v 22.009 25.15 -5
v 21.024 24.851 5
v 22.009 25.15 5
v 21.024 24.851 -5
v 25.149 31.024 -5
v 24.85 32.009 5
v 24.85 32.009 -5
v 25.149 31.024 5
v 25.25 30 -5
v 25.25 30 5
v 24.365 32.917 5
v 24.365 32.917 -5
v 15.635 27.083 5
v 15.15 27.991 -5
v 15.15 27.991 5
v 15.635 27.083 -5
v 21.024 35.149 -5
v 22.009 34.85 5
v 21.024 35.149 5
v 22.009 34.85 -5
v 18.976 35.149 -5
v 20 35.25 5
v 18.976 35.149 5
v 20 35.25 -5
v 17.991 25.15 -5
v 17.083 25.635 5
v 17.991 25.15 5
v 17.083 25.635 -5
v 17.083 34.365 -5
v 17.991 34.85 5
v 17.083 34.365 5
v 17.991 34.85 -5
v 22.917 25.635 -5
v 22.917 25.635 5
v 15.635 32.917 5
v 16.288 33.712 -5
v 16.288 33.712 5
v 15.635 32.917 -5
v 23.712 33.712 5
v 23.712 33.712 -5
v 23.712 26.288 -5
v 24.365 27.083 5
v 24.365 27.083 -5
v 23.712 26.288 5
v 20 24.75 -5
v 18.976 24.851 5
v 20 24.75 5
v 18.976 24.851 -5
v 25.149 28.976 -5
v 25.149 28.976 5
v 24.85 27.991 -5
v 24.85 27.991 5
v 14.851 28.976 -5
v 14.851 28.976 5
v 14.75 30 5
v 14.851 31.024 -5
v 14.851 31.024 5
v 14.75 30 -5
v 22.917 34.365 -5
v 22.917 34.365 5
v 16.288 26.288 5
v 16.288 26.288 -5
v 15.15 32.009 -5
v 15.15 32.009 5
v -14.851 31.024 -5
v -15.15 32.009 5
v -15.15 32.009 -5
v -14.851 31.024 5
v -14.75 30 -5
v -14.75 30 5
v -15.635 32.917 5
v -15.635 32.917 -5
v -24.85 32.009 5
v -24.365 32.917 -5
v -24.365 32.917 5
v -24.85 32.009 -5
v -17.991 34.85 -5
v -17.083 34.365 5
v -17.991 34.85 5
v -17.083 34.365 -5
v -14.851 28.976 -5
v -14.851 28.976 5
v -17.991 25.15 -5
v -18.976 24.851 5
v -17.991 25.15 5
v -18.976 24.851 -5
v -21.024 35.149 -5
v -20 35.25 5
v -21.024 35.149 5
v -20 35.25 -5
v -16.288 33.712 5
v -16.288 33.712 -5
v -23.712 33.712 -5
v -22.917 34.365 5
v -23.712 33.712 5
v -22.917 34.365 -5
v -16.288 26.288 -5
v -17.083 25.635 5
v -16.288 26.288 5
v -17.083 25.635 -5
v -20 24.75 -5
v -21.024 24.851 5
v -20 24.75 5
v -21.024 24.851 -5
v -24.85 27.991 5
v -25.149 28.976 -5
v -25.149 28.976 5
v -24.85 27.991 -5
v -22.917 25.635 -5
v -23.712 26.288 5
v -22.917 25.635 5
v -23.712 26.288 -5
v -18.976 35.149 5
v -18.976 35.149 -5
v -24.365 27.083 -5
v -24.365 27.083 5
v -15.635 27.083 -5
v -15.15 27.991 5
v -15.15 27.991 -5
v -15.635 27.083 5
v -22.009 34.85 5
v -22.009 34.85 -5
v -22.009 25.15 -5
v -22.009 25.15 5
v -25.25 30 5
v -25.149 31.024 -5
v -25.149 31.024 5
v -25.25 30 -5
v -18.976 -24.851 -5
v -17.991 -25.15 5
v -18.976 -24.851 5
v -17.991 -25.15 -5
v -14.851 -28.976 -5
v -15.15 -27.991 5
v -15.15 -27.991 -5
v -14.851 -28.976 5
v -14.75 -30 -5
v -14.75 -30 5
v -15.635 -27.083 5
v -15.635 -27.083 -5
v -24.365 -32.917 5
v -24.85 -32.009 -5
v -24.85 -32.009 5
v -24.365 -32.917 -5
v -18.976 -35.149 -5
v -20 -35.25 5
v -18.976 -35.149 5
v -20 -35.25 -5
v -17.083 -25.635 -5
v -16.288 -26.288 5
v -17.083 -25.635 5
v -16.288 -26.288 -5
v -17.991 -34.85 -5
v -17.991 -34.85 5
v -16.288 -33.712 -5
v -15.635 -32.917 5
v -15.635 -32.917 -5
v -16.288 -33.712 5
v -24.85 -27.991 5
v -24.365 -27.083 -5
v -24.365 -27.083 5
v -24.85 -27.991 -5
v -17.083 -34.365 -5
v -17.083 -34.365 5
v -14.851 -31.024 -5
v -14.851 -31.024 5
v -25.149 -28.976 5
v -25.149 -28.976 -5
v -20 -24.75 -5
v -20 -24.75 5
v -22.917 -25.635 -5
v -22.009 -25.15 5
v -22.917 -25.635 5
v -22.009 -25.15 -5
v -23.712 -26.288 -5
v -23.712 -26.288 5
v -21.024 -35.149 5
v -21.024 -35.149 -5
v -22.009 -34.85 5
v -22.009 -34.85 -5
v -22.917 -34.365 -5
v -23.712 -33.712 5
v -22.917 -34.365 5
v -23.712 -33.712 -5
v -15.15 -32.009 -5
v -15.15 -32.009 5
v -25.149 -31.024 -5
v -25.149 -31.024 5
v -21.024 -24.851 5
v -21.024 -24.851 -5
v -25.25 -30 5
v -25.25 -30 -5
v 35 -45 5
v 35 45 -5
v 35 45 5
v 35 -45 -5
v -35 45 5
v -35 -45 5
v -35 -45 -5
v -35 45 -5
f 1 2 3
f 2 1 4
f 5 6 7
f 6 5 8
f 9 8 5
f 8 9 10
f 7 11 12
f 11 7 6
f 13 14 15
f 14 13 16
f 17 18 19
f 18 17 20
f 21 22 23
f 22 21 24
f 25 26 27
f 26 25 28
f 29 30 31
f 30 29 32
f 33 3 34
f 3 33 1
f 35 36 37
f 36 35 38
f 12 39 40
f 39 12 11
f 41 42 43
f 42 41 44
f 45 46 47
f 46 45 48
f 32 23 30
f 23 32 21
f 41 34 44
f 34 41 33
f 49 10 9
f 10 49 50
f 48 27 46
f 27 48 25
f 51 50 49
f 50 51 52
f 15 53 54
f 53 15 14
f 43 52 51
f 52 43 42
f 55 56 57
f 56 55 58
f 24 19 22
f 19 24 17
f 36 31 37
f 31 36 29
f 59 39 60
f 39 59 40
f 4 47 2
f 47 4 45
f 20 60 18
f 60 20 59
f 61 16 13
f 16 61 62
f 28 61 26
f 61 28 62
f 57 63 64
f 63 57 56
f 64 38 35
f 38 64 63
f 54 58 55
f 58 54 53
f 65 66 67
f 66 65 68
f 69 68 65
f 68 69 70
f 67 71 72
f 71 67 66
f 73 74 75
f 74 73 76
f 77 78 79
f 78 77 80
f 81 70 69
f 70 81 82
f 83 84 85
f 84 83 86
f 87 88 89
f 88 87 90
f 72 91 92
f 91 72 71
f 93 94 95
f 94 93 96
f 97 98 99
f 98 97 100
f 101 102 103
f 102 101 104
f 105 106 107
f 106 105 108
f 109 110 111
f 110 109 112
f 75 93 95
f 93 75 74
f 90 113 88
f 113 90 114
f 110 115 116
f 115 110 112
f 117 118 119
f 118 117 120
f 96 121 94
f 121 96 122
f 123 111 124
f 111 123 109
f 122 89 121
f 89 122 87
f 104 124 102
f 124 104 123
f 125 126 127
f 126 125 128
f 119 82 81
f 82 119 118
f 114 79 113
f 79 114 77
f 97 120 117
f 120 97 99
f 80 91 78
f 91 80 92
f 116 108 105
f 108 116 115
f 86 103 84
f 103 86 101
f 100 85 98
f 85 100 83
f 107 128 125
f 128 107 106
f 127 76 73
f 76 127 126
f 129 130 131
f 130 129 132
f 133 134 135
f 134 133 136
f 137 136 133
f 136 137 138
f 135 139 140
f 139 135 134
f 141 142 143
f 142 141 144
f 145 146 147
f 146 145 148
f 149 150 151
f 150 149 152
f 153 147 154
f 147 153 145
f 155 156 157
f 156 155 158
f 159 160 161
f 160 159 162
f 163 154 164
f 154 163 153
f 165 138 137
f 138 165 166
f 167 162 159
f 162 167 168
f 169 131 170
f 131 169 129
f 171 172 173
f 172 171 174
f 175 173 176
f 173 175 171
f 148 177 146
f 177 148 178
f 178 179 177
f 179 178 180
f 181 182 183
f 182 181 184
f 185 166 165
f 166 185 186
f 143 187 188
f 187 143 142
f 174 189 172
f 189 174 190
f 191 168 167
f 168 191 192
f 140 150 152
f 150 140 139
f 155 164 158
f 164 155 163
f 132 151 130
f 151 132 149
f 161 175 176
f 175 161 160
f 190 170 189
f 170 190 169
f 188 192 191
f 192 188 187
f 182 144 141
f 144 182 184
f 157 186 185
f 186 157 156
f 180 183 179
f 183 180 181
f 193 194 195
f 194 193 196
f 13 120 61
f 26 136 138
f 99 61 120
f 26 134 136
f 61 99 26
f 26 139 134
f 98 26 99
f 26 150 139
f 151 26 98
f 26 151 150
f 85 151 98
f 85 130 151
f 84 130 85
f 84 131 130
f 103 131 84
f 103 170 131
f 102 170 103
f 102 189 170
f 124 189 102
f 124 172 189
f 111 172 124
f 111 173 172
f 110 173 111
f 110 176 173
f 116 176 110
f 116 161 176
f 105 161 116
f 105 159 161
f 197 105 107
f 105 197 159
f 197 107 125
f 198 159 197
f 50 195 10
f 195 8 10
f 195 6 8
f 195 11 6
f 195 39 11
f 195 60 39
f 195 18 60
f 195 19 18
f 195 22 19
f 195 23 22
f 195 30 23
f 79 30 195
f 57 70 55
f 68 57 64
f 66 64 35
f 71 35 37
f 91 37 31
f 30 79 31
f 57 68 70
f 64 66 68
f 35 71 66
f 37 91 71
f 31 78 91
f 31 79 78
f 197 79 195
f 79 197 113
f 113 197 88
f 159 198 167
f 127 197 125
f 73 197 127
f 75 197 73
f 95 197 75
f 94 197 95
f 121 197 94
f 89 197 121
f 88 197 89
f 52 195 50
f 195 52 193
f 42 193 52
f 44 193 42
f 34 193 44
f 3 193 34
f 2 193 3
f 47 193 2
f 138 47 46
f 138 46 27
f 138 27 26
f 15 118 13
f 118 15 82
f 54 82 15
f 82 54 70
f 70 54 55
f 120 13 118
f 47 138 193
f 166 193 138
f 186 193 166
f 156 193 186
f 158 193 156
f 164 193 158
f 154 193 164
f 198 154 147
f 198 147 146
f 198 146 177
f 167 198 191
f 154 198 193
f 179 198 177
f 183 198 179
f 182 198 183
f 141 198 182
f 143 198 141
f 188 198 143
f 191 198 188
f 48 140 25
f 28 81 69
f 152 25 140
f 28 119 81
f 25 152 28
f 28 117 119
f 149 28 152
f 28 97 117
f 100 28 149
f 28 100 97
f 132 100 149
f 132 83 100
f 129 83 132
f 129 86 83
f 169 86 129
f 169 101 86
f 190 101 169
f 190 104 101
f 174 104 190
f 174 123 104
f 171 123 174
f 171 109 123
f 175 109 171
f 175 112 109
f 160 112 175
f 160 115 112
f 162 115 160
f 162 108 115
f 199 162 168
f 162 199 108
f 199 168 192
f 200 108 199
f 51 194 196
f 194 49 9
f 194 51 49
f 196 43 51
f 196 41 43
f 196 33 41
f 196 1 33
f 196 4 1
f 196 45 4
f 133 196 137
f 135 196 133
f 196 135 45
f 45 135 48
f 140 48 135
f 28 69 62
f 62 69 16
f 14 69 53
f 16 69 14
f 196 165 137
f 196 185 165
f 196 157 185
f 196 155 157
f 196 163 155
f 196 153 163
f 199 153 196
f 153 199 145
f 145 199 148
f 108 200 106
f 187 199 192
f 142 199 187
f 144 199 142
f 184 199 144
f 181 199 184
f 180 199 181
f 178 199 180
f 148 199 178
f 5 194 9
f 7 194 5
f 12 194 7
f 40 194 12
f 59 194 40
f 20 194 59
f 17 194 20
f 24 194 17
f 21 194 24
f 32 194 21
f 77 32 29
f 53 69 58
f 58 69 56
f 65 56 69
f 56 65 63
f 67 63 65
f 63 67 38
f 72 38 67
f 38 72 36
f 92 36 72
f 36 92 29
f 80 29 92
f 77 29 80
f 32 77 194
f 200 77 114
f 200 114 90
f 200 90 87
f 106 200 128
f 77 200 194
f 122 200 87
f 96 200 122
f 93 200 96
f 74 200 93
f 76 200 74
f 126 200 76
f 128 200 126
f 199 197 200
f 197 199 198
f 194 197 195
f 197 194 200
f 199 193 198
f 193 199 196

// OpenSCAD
$fn = 32;

// ----------------------------------------------------------------------
// Corner plate 70 x 90 x 10
// 3 holes, centres taken from the edge offset
// ----------------------------------------------------------------------

// --- parameters (mm) ---
plate = [70, 90, 10];  // overall size (x, y, z)
holes = 3;             // number of holes the drawing asks for
hole_d = 10.5;         // hole diameter
edge = 15;             // hole centre offset from the plate edge

// --- derived feature positions (mm) ---
corner_x = plate[0] / 2 - edge;  // = 20   corner hole X
corner_y = plate[1] / 2 - edge;  // = 30   corner hole Y
feature_centers = [
  [corner_x, corner_y],
  [-corner_x, corner_y],
  [-corner_x, -corner_y]
];   // hole centres the loop below drills

// plate outline, every hole drilled through with the same cutters
difference() {
  cube(plate, center = true);
  for (centre = feature_centers)
    translate([centre[0], centre[1], 0])
      cylinder(d = hole_d, h = plate[2] + 2, center = true);
}
